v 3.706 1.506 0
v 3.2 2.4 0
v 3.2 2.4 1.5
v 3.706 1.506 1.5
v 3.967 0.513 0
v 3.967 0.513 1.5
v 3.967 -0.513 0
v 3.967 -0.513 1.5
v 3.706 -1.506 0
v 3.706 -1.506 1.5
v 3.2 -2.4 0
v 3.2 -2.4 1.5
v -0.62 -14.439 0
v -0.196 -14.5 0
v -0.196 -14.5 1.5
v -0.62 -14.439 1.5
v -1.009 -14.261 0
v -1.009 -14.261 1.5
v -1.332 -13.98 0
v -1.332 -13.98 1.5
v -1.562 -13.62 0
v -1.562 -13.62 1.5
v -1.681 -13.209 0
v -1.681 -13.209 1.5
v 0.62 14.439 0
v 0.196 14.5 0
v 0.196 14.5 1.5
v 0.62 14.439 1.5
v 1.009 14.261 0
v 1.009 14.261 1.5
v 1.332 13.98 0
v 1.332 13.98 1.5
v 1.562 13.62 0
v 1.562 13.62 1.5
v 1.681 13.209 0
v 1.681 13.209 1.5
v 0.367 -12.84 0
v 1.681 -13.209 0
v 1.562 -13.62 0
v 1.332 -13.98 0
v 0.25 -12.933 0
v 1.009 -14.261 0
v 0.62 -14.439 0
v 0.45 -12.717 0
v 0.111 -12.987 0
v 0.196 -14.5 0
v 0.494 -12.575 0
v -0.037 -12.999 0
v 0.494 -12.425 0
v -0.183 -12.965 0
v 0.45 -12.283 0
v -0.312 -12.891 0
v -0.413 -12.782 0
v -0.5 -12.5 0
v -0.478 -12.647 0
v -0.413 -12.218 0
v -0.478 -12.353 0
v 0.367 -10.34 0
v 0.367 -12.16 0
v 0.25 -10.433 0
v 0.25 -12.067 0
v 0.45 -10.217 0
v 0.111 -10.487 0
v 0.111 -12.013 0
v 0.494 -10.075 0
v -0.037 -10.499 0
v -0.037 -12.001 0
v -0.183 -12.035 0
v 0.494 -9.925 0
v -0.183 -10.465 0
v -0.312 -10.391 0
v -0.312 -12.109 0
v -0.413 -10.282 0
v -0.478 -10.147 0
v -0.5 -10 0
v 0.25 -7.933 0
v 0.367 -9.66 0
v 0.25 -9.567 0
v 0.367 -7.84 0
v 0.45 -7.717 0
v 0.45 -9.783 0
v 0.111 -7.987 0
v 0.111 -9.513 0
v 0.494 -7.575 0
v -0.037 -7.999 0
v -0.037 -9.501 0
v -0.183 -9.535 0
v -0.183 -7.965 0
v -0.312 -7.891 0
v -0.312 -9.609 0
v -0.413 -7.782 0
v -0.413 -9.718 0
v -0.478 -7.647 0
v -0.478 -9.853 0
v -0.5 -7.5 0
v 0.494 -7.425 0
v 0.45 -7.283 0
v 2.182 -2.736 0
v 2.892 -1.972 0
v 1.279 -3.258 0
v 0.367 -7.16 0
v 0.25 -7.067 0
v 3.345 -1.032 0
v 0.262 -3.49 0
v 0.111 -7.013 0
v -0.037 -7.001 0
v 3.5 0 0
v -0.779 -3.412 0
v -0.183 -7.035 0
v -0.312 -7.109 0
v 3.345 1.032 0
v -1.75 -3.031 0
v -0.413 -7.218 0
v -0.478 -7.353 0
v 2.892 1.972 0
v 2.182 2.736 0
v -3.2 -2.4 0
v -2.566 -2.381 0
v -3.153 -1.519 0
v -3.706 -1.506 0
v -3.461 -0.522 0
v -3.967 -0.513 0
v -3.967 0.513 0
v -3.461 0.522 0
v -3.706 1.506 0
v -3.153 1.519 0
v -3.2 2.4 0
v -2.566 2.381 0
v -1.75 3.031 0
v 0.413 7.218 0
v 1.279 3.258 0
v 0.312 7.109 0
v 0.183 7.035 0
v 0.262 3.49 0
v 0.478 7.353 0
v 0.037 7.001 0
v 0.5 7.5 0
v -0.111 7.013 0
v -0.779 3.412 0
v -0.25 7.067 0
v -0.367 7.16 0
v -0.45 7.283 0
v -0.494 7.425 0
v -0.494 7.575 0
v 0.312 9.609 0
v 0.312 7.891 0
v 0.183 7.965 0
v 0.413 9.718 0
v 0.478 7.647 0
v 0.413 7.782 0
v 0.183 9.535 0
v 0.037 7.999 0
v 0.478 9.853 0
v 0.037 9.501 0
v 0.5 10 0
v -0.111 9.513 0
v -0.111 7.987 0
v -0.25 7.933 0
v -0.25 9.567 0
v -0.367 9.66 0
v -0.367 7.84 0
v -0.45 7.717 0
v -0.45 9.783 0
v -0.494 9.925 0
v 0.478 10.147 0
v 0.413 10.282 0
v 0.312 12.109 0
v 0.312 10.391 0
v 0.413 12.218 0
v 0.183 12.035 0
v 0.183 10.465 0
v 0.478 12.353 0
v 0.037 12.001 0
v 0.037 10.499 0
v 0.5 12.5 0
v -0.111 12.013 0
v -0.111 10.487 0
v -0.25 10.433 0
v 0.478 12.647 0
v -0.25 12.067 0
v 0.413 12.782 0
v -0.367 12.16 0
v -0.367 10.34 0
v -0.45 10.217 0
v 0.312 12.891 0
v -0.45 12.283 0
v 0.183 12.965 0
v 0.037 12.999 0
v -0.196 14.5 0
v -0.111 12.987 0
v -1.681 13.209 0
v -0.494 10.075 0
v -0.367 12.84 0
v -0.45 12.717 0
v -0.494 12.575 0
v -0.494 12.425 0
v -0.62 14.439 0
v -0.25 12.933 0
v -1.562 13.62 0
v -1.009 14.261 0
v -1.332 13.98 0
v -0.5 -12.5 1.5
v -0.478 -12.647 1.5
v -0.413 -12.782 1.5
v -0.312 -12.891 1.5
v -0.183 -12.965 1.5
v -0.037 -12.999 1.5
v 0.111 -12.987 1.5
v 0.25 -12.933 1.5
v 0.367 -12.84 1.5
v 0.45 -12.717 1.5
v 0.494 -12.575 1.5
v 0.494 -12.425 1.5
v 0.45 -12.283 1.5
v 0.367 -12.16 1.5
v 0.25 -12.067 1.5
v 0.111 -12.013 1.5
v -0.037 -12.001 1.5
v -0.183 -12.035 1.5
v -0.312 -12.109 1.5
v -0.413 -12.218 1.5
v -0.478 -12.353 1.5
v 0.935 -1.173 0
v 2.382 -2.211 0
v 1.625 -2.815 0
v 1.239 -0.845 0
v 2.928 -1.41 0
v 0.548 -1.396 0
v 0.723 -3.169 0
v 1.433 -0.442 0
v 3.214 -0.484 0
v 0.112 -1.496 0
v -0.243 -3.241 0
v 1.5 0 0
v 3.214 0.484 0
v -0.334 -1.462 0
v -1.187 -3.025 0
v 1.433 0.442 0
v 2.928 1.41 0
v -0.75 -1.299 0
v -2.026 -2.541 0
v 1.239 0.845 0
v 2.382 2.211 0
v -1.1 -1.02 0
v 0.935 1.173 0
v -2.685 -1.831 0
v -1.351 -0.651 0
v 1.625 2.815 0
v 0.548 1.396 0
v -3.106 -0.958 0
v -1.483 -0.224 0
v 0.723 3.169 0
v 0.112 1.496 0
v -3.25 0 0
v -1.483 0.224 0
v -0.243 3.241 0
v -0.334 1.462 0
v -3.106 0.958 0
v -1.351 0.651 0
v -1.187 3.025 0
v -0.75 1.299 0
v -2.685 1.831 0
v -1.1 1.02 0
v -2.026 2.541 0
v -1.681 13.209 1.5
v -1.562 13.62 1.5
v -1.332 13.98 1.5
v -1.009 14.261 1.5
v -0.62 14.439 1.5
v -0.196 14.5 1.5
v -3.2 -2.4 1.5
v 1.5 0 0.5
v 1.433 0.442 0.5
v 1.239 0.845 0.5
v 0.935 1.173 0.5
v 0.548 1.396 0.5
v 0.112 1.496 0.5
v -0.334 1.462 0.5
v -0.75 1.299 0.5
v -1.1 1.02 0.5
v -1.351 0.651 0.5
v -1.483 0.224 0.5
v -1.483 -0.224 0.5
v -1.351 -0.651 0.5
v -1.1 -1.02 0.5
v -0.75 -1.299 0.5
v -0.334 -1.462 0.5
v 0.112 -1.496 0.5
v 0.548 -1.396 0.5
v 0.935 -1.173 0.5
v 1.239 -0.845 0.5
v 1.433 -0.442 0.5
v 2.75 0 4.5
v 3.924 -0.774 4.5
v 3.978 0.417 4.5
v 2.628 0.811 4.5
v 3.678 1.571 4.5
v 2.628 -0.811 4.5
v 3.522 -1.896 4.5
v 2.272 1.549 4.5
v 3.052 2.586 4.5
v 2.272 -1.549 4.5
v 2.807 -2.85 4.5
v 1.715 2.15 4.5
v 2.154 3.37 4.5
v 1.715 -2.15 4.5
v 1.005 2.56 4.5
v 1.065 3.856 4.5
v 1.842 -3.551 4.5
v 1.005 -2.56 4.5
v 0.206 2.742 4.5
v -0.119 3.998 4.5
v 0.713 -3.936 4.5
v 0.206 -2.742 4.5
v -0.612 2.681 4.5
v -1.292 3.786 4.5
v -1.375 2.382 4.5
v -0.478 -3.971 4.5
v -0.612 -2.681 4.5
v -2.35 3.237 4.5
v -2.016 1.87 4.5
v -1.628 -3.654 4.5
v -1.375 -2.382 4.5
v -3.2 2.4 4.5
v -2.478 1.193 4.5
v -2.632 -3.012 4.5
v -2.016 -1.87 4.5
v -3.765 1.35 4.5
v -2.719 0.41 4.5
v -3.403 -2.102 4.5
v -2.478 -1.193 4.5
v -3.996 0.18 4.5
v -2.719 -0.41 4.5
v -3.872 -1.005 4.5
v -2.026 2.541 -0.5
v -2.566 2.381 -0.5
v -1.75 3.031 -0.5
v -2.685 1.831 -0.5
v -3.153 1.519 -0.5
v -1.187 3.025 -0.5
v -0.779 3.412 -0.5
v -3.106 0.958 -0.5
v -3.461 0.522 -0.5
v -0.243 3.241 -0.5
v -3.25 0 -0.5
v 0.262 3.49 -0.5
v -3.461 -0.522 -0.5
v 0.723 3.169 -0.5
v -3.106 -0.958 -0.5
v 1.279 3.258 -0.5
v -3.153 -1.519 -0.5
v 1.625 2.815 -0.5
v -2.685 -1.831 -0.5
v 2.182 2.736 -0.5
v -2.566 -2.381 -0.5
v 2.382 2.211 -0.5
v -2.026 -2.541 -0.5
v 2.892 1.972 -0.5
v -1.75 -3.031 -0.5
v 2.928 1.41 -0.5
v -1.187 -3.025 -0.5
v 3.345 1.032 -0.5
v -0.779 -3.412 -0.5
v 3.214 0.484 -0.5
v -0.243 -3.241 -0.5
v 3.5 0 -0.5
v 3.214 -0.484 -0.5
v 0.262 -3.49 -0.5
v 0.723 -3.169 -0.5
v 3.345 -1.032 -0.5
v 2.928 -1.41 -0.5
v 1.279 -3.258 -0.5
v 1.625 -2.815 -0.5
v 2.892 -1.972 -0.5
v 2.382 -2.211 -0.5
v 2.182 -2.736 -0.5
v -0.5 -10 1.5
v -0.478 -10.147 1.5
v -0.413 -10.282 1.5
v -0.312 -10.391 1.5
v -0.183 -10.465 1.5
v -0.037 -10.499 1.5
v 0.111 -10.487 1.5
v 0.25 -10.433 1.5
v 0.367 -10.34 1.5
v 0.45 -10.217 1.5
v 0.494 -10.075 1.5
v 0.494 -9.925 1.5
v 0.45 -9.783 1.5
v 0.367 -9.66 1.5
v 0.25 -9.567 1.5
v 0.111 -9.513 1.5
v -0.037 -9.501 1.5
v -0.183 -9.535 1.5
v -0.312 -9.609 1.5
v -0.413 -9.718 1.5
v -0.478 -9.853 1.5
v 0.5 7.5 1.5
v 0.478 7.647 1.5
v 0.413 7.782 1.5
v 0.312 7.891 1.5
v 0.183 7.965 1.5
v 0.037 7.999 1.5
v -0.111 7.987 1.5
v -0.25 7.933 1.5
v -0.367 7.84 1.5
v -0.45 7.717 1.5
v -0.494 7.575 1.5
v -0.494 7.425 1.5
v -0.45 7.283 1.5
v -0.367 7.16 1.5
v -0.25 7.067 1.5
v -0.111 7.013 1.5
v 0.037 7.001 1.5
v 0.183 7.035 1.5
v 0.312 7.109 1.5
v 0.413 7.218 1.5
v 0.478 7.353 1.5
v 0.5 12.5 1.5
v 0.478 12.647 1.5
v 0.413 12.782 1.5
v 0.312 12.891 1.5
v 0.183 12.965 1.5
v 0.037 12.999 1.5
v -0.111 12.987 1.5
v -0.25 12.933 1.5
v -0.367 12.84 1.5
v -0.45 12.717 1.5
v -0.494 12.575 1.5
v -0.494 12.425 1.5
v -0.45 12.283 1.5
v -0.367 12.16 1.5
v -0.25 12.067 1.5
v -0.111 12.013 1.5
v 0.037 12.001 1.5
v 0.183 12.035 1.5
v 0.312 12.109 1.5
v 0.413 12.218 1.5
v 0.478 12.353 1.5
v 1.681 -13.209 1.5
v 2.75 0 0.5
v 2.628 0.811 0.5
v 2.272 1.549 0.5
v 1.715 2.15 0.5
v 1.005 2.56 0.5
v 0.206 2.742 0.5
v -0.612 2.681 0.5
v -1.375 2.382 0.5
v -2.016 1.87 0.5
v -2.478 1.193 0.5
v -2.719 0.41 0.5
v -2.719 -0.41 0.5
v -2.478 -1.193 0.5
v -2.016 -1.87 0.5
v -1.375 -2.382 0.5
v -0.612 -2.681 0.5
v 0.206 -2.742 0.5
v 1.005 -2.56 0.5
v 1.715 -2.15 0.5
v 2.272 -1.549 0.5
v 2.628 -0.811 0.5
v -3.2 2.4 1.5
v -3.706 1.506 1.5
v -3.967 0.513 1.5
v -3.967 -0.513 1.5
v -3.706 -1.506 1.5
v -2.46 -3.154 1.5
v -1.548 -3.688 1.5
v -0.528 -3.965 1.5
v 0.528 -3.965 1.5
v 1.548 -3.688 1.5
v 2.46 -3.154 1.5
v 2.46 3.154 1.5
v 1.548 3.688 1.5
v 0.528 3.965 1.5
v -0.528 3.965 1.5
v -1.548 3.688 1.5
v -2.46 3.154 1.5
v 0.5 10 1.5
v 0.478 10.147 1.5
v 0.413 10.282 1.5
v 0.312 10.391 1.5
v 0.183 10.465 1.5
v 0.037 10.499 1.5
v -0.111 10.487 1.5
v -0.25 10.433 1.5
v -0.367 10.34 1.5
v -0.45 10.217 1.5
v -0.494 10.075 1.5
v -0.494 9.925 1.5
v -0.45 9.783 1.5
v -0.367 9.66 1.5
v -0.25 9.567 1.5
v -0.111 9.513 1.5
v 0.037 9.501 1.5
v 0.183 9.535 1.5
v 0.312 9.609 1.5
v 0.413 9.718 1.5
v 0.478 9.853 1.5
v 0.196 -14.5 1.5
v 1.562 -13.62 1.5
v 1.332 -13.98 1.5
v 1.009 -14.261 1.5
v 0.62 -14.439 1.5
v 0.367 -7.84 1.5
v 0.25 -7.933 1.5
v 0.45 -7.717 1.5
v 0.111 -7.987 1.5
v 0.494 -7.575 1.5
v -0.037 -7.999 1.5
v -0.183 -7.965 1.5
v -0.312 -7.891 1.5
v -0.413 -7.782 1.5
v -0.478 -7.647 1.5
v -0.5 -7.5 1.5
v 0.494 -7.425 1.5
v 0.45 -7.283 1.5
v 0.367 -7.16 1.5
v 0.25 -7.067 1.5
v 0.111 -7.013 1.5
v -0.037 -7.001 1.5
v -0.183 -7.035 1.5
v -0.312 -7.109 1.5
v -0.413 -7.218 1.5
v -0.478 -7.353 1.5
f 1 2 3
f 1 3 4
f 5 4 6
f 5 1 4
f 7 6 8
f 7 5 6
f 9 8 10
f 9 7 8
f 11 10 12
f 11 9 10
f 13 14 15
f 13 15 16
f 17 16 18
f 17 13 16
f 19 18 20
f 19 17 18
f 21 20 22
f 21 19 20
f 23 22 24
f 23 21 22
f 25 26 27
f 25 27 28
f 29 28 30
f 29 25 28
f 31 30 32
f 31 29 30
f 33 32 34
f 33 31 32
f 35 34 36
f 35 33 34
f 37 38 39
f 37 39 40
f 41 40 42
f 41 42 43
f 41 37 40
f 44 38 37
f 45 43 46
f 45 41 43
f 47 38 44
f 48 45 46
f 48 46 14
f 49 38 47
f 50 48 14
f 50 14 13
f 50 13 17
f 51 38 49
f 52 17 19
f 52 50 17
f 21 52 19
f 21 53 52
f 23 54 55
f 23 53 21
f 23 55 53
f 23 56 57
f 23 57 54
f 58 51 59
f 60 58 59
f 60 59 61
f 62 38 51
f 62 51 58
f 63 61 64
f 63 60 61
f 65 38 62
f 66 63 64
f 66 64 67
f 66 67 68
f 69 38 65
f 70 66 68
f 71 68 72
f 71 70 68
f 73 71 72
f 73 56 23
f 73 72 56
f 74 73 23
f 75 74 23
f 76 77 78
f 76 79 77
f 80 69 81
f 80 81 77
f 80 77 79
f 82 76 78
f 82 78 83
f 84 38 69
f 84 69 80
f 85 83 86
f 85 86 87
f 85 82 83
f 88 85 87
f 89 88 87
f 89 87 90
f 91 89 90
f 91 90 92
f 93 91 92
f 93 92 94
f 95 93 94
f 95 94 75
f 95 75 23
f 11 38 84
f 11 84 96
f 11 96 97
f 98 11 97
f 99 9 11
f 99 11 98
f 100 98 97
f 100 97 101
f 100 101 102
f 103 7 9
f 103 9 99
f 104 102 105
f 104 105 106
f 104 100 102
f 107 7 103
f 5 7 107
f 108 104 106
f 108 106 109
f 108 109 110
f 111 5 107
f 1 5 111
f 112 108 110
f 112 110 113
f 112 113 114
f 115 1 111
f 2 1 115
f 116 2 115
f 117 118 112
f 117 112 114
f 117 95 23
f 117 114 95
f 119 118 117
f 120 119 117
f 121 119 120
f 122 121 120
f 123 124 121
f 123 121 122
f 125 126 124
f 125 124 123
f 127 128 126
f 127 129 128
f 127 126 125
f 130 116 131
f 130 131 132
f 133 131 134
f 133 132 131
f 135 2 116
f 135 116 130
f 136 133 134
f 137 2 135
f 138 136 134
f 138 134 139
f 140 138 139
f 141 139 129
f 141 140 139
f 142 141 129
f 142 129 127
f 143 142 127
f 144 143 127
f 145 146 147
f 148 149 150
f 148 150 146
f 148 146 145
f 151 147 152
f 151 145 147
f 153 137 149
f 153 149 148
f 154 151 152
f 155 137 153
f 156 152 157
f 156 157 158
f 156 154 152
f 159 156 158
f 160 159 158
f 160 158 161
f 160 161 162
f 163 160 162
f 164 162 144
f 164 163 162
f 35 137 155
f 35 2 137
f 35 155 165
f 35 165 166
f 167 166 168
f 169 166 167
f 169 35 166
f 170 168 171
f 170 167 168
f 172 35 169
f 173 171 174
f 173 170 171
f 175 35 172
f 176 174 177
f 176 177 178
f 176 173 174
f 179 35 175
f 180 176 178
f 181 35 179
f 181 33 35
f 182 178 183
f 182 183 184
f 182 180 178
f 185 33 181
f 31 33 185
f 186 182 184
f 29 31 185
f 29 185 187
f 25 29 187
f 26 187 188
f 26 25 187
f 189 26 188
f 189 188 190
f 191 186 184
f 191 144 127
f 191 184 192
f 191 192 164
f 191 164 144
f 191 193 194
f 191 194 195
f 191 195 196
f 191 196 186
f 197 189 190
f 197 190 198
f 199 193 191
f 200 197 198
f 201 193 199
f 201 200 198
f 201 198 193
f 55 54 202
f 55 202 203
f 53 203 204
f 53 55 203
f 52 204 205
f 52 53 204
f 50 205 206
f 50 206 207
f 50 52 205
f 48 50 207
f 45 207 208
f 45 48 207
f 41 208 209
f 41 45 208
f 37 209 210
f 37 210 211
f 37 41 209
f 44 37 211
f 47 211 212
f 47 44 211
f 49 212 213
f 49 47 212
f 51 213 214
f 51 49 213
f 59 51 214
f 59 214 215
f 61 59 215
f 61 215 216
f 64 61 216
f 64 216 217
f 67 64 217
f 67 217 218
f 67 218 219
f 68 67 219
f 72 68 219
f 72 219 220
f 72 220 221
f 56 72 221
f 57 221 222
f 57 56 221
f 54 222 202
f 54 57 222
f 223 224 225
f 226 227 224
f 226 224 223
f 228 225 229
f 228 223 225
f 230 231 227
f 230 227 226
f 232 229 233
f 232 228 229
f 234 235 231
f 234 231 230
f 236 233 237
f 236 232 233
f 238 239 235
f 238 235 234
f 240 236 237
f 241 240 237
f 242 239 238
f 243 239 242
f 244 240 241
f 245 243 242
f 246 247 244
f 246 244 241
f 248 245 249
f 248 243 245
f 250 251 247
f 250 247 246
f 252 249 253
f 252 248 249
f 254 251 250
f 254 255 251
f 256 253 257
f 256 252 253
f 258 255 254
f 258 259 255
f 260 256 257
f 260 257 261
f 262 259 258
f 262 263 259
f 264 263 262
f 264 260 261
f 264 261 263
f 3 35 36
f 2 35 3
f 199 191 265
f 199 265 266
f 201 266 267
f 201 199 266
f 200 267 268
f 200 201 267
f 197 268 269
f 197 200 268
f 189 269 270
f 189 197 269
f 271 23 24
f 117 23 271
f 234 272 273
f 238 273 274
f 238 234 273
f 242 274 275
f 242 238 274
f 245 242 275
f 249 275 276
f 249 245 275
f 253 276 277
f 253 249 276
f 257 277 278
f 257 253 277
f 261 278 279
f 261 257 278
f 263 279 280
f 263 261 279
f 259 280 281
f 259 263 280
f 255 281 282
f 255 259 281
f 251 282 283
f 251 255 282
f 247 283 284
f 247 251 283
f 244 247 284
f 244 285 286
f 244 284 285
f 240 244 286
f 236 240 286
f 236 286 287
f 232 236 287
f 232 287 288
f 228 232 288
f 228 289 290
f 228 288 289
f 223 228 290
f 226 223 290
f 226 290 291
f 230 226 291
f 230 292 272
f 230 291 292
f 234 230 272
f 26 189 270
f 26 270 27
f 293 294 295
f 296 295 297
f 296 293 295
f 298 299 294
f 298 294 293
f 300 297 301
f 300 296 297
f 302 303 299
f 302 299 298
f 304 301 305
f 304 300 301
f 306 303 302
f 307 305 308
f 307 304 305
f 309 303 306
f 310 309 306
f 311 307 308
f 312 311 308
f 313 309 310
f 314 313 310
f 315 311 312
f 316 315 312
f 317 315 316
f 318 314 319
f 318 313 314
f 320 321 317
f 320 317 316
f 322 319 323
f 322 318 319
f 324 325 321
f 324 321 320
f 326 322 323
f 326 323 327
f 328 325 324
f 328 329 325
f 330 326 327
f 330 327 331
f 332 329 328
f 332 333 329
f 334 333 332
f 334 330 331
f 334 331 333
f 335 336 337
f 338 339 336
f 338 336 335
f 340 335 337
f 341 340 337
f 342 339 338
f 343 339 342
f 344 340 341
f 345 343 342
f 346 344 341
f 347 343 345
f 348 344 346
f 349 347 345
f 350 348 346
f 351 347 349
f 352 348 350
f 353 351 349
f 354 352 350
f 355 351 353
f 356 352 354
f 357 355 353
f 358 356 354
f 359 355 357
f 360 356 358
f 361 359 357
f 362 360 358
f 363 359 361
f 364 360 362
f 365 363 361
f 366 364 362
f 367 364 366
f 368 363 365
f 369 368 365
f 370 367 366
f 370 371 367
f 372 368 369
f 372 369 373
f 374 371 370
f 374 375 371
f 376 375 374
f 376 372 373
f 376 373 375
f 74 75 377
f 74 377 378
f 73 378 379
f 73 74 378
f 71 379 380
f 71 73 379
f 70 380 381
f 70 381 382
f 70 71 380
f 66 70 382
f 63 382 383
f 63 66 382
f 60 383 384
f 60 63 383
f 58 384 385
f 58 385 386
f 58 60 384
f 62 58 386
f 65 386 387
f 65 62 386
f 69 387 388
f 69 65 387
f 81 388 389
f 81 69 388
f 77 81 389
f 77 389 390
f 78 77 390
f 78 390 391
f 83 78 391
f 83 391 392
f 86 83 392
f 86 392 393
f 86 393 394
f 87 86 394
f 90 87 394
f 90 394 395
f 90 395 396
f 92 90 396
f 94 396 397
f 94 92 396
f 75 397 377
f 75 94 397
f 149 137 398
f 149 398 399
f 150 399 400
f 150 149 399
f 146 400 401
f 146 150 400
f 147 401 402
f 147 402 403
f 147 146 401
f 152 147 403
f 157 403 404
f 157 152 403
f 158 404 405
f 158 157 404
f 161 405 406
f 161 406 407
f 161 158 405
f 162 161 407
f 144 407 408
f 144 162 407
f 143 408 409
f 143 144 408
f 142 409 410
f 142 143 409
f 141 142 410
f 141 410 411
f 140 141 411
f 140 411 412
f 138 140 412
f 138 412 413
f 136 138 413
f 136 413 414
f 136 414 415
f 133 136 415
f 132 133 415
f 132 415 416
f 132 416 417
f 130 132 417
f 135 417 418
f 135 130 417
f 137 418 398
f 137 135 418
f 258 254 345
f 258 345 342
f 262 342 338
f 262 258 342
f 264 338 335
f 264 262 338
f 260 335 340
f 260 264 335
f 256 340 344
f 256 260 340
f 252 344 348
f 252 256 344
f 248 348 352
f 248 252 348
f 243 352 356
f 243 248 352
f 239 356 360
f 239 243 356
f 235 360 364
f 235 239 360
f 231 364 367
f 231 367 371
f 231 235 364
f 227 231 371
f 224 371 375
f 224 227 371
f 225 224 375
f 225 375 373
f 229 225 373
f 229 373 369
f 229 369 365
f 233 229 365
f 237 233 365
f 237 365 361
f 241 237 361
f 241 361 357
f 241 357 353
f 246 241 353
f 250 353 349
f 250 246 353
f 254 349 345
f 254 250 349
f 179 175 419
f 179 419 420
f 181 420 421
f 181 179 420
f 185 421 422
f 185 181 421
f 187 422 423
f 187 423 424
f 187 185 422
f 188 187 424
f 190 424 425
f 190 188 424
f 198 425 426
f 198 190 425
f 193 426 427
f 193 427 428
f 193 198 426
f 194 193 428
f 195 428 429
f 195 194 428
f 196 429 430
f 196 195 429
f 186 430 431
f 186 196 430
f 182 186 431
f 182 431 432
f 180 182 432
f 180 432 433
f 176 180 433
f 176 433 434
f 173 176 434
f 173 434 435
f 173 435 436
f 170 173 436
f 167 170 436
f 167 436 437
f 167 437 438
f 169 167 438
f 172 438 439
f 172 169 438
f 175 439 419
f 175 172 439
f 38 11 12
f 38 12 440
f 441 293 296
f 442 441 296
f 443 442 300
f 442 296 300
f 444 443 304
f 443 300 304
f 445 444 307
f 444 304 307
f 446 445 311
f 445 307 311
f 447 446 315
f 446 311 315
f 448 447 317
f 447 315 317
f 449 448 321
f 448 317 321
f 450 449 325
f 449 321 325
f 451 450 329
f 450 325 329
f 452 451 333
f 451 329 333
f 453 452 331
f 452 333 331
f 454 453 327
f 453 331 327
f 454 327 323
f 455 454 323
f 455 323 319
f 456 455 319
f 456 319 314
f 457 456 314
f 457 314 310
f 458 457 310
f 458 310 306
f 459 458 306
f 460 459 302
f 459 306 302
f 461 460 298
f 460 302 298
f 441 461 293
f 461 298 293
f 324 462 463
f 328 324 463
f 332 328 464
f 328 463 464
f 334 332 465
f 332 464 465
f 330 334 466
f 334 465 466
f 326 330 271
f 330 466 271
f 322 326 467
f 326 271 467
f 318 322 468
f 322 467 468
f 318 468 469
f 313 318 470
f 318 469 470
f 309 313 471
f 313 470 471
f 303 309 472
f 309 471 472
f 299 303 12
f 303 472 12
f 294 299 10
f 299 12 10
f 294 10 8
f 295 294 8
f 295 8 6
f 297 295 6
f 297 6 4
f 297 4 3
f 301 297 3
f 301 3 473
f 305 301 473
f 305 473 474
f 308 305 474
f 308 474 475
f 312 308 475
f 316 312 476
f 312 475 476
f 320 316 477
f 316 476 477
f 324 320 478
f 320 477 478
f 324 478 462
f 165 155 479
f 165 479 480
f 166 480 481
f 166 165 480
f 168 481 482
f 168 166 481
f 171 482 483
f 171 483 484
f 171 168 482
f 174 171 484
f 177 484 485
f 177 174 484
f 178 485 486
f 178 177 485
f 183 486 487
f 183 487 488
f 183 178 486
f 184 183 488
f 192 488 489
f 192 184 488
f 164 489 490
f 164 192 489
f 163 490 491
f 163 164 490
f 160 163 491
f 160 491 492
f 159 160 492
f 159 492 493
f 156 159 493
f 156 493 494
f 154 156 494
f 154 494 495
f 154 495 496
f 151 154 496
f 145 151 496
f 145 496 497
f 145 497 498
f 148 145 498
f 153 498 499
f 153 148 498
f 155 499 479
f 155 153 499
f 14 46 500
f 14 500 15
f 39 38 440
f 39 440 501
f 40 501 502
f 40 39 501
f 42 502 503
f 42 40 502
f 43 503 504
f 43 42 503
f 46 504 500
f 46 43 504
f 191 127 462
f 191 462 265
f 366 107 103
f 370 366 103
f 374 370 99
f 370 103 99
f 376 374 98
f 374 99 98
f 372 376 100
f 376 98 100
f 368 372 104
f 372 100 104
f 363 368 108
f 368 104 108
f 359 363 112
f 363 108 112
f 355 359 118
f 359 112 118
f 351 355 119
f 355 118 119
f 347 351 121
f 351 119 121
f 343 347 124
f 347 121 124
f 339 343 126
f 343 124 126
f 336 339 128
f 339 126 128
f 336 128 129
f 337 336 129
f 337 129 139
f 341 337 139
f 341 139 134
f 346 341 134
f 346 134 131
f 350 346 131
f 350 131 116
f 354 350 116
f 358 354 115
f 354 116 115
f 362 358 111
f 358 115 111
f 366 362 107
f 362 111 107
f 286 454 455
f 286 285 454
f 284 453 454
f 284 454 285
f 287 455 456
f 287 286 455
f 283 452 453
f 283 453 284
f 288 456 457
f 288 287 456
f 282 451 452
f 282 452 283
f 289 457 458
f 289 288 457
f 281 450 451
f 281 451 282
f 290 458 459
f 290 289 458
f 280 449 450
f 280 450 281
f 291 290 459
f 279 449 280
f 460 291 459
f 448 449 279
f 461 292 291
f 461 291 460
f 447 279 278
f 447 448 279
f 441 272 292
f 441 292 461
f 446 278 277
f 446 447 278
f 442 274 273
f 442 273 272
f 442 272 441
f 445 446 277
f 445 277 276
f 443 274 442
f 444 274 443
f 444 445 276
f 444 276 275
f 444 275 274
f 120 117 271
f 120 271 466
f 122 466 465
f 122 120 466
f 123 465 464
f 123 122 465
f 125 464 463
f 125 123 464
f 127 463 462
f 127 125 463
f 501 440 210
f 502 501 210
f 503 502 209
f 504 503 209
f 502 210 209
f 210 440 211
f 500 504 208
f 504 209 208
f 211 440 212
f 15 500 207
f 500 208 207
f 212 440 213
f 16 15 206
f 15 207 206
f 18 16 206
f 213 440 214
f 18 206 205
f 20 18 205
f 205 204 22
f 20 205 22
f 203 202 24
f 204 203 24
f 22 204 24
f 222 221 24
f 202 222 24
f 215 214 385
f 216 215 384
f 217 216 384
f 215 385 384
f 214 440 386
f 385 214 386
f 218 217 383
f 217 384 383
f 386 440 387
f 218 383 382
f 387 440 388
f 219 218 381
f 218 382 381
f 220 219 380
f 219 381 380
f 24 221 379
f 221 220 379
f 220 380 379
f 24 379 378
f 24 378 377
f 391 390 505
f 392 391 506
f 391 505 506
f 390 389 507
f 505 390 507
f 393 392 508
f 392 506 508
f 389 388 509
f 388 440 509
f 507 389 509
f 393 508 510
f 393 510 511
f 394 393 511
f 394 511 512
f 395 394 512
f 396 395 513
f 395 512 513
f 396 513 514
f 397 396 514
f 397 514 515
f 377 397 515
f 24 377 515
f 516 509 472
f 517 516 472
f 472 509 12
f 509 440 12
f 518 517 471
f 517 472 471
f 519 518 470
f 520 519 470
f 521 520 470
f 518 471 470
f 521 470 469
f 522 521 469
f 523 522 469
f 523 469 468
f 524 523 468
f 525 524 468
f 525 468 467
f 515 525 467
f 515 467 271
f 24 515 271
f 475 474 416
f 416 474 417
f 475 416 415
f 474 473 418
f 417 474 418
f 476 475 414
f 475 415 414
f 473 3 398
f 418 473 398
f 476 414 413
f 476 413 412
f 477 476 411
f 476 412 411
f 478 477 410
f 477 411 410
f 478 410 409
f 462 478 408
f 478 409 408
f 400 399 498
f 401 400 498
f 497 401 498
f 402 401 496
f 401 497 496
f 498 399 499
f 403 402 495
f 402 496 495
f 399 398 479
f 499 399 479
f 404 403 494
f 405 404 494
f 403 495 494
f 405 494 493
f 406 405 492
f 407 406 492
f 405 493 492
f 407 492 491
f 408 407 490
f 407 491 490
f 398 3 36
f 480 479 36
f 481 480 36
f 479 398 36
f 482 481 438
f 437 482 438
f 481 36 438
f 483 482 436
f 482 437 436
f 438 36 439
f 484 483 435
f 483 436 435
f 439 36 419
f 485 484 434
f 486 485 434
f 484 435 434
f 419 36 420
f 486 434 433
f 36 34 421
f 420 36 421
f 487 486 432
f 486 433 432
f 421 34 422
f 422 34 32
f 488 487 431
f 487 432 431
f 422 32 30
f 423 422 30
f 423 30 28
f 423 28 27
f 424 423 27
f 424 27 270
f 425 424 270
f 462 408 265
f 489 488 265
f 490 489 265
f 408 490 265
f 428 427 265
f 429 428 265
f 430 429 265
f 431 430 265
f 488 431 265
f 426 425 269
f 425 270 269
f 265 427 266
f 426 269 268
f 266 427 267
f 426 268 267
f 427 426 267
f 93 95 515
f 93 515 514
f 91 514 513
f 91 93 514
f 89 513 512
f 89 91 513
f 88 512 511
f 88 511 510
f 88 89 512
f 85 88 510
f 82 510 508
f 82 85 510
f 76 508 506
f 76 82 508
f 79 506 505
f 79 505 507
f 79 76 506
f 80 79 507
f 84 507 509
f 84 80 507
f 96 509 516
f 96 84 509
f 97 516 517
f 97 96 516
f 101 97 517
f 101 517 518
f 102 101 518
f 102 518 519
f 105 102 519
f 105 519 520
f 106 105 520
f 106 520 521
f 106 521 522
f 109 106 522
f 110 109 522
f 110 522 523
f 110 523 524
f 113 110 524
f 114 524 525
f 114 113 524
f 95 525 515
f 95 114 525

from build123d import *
from build123d.topology import SkipClean

# Parameters (mm, degrees)
SKETCH1_R           = 0.5
SKETCH1_R_2         = 1.5
BOSS_EXTRUDE3_DEPTH = 1.5
SKETCH2_R           = 4
BOSS_EXTRUDE4_DEPTH = 3
SKETCH3_R           = 3.5
SKETCH3_R_2         = 3.25
BOSS_EXTRUDE5_DEPTH = 0.5
SKETCH4_R           = 2.75
CUT_EXTRUDE1_DEPTH  = 4


with BuildPart() as part:
    # Sketch1 → Boss-Extrude3 (new body)
    with BuildSketch(Plane.XY):
        with BuildLine():
            Line((-3.2, 2.4), (-1.681423136, 13.208694151))
            ThreePointArc((-1.681423136, 13.208694151), (-1.180125332, 14.132042673), (-0.196011829, 14.5))
            Line((-0.196011829, 14.5), (0.196011829, 14.5))
            ThreePointArc((0.196011829, 14.5), (1.180125332, 14.132042673), (1.681423136, 13.208694151))
            Line((1.681423136, 13.208694151), (3.2, 2.4))
            ThreePointArc((3.2, 2.4), (4, 0), (3.2, -2.4))
            Line((3.2, -2.4), (1.681423136, -13.208694151))
            ThreePointArc((1.681423136, -13.208694151), (1.180125332, -14.132042673), (0.196011829, -14.5))
            Line((0.196011829, -14.5), (-0.196011829, -14.5))
            ThreePointArc((-0.196011829, -14.5), (-1.180125332, -14.132042673), (-1.681423136, -13.208694151))
            Line((-1.681423136, -13.208694151), (-3.2, -2.4))
            ThreePointArc((-3.2, -2.4), (-4, 0), (-3.2, 2.4))
        make_face()
        with Locations((0, 10)):
            Circle(SKETCH1_R, mode=Mode.SUBTRACT)
        with Locations((0, 12.5)):
            Circle(SKETCH1_R, mode=Mode.SUBTRACT)
        with Locations((0, 7.5)):
            Circle(SKETCH1_R, mode=Mode.SUBTRACT)
        Circle(SKETCH1_R_2, mode=Mode.SUBTRACT)
        with Locations(Location((0, -7.5, 0), (0, 0, 180))):
            Circle(SKETCH1_R, mode=Mode.SUBTRACT)
        with Locations(Location((0, -12.5, 0), (0, 0, 180))):
            Circle(SKETCH1_R, mode=Mode.SUBTRACT)
        with Locations(Location((0, -10, 0), (0, 0, 180))):
            Circle(SKETCH1_R, mode=Mode.SUBTRACT)
    extrude(amount=BOSS_EXTRUDE3_DEPTH)

    # Sketch2 → Boss-Extrude4 (add)
    with SkipClean():  # the faces are left unmerged after this step: merging them gives an invalid solid
        with BuildSketch(Plane.XY.offset(1.5)):
            with Locations(Location((0, 0, 0), (0, 0, 143.130102354))):
                Circle(SKETCH2_R)
        extrude(amount=BOSS_EXTRUDE4_DEPTH)

    # Sketch3 → Boss-Extrude5 (add)
    with SkipClean():  # the faces are left unmerged after this step: merging them gives an invalid solid
        with BuildSketch(Plane(origin=(0, 0, 0), x_dir=(-1, 0, 0), z_dir=(0, 0, -1))):
            with Locations(Location((0, 0, 0), (0, 0, 180))):
                Circle(SKETCH3_R)
            Circle(SKETCH3_R_2, mode=Mode.SUBTRACT)
        extrude(amount=BOSS_EXTRUDE5_DEPTH)

    # Sketch4 → Cut-Extrude1 (cut)
    with SkipClean():  # the faces are left unmerged after this step: merging them gives an invalid solid
        with BuildSketch(Plane.XY.offset(4.5)):
            Circle(SKETCH4_R)
        extrude(amount=-CUT_EXTRUDE1_DEPTH, mode=Mode.SUBTRACT)


solid = part.part
